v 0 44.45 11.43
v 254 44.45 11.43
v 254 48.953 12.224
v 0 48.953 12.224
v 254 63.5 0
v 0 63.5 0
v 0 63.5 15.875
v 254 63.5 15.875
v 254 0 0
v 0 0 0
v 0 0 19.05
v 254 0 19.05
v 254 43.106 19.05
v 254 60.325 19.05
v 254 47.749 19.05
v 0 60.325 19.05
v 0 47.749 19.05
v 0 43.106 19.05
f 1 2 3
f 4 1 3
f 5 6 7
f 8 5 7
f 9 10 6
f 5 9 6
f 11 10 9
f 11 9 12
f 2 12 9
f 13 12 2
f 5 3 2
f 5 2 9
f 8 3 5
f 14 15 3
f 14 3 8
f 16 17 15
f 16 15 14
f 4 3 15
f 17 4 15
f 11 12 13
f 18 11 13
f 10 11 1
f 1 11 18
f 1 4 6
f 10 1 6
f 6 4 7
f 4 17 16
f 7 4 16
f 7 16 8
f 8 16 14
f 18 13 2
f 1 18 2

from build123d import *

# Parameters (mm, degrees)
F0_W     = 63.5
F0_H     = 19.05
F1_DEPTH = 254
F2_SIZE  = 3.175
F4_DEPTH = 254.001


with BuildPart() as f1:
    # F0 (on Right) → F1 (new body)
    with BuildSketch(Plane.YZ):
        with Locations((31.75, 9.525)):
            Rectangle(F0_W, F0_H)
    extrude(amount=F1_DEPTH)

    # F2
    f2_edges = [f1.edges().sort_by_distance(p)[0] for p in [
        (127, 63.5, 19.05),
    ]]
    chamfer(f2_edges, length=F2_SIZE)

    # F3 (on face) → F4 (cut, through all)
    with BuildSketch(Plane.YZ.offset(254)):
        Polygon((45.888826, 29.599109), (41.386285, 28.80519), (44.45, 11.43), (48.952541, 12.223919), align=None)
    extrude(amount=-F4_DEPTH, mode=Mode.SUBTRACT)


with BuildPart() as f5_1:
    # F5: copy of F1
    add(f1.part.moved(Location((0, 0, 82.55))))


with BuildPart() as f6_1:
    # F6: copy of F1
    add(f1.part.moved(Location((0, 0, 165.1))))


with BuildPart() as f7_1:
    # F7: copy of F1
    add(f1.part.moved(Location((0, 0, 247.65))))


solid = f1.part
